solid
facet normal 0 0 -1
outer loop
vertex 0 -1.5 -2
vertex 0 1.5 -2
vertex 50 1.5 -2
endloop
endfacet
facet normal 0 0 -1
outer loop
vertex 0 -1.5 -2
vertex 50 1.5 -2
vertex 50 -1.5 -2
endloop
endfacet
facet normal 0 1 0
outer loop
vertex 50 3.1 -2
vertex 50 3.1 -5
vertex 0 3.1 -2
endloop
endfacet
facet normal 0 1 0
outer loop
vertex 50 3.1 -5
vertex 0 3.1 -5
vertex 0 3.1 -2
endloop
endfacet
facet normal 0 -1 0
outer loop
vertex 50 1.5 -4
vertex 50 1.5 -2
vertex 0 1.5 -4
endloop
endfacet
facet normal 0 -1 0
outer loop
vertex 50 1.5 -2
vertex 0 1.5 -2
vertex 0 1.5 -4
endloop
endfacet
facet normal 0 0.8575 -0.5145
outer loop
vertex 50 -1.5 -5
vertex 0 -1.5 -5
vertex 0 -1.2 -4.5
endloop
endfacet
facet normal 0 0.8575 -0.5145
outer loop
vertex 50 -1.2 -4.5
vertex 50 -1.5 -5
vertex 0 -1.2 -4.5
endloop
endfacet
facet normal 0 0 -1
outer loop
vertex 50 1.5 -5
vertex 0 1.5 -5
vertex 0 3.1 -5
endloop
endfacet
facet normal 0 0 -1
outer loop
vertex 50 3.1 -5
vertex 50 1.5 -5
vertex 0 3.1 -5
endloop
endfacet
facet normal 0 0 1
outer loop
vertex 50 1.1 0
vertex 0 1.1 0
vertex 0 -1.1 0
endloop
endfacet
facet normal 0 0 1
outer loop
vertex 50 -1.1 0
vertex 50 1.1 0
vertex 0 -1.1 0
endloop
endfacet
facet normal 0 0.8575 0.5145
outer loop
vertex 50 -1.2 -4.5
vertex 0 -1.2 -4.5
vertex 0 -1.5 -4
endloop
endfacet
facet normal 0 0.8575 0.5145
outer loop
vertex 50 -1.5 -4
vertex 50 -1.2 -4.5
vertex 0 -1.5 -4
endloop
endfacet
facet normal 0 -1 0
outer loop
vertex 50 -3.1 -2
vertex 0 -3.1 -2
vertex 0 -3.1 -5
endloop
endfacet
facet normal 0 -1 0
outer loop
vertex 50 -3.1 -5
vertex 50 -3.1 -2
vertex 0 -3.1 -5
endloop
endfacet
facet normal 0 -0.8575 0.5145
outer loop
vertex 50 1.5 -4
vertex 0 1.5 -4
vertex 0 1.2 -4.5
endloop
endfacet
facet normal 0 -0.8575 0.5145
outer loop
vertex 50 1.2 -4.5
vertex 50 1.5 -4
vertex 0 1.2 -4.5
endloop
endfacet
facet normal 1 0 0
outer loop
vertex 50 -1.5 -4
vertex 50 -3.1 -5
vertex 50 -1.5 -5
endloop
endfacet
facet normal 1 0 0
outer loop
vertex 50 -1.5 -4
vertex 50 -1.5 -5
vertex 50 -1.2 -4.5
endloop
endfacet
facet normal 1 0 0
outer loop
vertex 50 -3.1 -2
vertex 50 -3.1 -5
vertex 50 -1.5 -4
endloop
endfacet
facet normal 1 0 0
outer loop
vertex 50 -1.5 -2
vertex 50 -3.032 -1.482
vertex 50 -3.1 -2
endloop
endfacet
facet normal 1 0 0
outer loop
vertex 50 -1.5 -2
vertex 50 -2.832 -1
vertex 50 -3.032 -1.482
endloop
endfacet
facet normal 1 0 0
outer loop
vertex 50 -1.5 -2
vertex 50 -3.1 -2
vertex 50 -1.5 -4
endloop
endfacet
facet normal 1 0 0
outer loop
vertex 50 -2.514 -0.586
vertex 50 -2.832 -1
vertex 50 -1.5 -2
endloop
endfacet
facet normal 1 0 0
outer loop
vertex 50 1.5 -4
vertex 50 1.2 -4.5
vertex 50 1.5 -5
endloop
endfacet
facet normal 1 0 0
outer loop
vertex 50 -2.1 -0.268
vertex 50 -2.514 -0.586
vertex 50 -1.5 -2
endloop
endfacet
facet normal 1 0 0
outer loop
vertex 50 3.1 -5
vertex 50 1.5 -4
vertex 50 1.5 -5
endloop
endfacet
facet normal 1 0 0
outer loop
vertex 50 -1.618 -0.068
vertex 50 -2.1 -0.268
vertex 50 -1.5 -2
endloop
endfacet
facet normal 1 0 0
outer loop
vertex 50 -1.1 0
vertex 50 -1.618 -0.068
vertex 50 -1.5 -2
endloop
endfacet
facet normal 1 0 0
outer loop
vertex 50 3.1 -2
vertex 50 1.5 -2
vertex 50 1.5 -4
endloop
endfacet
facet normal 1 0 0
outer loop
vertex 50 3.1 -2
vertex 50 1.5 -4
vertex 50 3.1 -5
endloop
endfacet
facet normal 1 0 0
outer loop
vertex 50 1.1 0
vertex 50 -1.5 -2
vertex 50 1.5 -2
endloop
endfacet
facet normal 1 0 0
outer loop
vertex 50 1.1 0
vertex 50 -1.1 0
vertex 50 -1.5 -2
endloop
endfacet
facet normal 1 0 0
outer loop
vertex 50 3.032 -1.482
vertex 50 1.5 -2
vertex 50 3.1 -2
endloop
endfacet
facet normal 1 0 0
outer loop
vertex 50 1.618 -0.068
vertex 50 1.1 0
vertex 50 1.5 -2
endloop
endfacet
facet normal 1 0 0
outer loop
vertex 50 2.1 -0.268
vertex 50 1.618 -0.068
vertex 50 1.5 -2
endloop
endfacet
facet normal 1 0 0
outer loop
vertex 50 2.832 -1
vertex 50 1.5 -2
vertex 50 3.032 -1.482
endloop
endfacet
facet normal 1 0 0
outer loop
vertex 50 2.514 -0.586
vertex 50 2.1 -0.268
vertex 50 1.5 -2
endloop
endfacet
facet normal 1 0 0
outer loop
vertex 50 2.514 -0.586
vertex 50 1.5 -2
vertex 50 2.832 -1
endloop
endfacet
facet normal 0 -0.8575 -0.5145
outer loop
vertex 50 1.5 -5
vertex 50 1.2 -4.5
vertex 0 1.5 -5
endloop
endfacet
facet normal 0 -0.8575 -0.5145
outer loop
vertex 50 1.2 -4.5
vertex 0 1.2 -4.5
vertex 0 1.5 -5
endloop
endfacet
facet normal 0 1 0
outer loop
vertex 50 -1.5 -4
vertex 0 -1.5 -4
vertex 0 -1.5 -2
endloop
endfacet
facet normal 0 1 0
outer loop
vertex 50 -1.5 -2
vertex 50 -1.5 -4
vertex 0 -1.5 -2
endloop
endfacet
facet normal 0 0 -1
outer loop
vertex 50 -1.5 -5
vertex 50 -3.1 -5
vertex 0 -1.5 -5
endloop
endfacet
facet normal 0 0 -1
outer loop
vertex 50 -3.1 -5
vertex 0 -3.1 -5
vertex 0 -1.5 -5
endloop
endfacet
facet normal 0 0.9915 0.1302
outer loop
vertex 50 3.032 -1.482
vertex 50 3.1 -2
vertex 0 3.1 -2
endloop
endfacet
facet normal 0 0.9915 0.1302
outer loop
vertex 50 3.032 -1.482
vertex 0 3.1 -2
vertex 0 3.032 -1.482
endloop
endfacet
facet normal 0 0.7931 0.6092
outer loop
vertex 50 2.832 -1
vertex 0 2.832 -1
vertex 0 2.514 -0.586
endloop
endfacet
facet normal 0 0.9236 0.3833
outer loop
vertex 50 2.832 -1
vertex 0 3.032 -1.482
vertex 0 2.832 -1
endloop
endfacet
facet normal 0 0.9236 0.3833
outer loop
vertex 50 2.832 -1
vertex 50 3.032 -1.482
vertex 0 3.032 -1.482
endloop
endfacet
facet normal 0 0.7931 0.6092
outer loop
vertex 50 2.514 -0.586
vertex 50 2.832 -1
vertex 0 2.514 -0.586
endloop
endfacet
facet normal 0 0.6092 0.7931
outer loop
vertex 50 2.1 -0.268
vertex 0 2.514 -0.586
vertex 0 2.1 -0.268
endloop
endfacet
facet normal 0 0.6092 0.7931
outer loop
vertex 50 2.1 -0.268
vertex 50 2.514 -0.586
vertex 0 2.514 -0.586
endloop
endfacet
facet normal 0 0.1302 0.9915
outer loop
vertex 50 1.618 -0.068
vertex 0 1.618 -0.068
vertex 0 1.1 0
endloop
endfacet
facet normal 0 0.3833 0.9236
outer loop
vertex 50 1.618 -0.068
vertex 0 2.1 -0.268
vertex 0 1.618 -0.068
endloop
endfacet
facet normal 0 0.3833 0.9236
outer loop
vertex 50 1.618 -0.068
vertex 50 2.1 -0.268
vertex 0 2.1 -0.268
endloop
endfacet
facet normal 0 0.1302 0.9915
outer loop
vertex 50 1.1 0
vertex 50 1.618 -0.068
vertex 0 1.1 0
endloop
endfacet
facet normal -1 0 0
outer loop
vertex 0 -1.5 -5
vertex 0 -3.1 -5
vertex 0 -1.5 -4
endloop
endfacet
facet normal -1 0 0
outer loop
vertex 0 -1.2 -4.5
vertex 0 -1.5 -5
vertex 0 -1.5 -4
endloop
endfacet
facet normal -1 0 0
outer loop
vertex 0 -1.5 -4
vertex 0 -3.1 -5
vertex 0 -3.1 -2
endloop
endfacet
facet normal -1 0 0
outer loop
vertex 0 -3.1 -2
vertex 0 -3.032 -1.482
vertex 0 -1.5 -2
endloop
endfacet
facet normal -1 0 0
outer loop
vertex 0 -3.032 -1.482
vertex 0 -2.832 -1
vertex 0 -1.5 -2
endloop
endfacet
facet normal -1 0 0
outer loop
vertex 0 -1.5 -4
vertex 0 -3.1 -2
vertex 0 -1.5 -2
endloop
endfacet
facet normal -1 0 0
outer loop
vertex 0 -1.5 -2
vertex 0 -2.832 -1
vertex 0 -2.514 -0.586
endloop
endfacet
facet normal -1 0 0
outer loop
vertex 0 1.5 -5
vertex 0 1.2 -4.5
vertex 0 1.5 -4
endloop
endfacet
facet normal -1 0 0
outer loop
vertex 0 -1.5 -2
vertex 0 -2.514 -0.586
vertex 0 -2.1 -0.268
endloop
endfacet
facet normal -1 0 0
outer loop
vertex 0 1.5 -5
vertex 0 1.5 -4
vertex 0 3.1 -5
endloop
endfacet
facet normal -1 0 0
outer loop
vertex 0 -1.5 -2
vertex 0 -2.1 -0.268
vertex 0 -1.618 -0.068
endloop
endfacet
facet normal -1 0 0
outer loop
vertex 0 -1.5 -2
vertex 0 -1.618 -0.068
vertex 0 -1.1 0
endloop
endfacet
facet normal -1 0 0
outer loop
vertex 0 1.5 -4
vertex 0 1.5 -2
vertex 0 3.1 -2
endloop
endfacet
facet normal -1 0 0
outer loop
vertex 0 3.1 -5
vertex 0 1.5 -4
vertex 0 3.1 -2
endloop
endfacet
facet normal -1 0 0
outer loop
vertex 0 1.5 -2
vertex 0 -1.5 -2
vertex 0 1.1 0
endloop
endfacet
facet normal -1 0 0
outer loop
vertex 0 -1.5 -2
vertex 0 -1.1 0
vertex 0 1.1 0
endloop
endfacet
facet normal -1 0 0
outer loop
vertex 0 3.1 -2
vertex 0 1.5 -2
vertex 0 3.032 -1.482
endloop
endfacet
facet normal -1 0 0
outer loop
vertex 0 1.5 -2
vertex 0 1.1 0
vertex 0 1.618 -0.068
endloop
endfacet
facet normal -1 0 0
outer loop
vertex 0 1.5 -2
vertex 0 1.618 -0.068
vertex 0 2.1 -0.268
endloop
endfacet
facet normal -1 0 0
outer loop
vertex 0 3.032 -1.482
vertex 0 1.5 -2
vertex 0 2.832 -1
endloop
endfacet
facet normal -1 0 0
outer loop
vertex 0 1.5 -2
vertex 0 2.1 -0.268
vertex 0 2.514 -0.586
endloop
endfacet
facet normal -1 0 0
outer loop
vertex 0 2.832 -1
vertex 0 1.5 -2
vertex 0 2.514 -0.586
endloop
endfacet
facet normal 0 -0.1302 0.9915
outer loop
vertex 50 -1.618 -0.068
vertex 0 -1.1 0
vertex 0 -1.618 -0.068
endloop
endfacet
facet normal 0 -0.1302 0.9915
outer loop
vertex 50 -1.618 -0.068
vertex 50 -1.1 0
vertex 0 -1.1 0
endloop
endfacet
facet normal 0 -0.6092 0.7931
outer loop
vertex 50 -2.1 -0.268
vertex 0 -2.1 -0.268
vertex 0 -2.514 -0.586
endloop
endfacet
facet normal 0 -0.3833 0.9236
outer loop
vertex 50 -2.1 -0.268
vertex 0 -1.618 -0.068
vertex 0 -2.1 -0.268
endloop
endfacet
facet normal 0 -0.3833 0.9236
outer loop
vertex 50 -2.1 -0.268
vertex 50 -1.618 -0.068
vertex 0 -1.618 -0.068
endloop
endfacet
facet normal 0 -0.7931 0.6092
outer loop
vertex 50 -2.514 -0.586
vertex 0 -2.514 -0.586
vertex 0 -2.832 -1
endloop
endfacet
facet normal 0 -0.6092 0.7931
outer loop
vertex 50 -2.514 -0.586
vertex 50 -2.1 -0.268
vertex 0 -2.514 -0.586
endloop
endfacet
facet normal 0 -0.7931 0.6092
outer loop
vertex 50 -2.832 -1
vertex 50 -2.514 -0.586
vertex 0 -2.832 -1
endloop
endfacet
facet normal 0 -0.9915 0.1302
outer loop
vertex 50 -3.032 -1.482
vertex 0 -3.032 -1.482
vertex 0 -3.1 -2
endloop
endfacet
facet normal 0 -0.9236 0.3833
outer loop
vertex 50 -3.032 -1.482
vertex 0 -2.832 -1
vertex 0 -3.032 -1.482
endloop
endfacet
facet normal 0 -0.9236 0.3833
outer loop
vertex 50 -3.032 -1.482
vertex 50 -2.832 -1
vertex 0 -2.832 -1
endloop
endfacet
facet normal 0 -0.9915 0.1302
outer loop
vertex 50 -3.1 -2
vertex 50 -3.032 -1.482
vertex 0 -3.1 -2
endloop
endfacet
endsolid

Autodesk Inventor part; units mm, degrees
ref_plane "YZ Plane" through (0, 0, 0) normal (1, 0, 0) x (0, 1, 0)
ref_plane "XZ Plane" through (0, 0, 0) normal (0, 1, 0) x (-1, 0, 0)
ref_plane "XY Plane" through (0, 0, 0) normal (0, 0, 1) x (1, 0, 0)
sketch "Sketch1" plane through (0, 0, 0) normal (1, 0, 0) x (0, 1, 0)
  line L0 (1.5, -2) -> (-1.5, -2)
  line L1 (1.5, -2) -> (1.5, -4)
  line L2 (1.5, -4) -> (1.2, -4.5)
  line L3 (1.2, -4.5) -> (1.5, -5)
  line L4 (1.5, -5) -> (3.1, -5)
  line L5 (3.1, -5) -> (3.1, 0)
  line L6 (3.1, 0) -> (-3.1, 0)
  line L7 (-3.1, 0) -> (-3.1, -5)
  line L8 (-3.1, -5) -> (-1.5, -5)
  line L9 (-1.5, -5) -> (-1.2, -4.5)
  line L10 (-1.2, -4.5) -> (-1.5, -4)
  line L11 (-1.5, -4) -> (-1.5, -2)
  point P0 (0, 0)
  point P1 (0, -2)
  dimension "d0" = 3
  dimension "d1" = 2
  dimension "d2" = 1.6
  dimension "d3" = 1.6
  dimension "d4" = 0.3
  dimension "d5" = 3
  dimension "d6" = 2
extrude "Extrusion1" add sketch "Sketch1" along normal blind 50
fillet "Fillet1" radius 2 2 edges at (25, 3.1, 0) (25, -3.1, 0)
properties part number "ForceStopper" material "ABS Plastic"
